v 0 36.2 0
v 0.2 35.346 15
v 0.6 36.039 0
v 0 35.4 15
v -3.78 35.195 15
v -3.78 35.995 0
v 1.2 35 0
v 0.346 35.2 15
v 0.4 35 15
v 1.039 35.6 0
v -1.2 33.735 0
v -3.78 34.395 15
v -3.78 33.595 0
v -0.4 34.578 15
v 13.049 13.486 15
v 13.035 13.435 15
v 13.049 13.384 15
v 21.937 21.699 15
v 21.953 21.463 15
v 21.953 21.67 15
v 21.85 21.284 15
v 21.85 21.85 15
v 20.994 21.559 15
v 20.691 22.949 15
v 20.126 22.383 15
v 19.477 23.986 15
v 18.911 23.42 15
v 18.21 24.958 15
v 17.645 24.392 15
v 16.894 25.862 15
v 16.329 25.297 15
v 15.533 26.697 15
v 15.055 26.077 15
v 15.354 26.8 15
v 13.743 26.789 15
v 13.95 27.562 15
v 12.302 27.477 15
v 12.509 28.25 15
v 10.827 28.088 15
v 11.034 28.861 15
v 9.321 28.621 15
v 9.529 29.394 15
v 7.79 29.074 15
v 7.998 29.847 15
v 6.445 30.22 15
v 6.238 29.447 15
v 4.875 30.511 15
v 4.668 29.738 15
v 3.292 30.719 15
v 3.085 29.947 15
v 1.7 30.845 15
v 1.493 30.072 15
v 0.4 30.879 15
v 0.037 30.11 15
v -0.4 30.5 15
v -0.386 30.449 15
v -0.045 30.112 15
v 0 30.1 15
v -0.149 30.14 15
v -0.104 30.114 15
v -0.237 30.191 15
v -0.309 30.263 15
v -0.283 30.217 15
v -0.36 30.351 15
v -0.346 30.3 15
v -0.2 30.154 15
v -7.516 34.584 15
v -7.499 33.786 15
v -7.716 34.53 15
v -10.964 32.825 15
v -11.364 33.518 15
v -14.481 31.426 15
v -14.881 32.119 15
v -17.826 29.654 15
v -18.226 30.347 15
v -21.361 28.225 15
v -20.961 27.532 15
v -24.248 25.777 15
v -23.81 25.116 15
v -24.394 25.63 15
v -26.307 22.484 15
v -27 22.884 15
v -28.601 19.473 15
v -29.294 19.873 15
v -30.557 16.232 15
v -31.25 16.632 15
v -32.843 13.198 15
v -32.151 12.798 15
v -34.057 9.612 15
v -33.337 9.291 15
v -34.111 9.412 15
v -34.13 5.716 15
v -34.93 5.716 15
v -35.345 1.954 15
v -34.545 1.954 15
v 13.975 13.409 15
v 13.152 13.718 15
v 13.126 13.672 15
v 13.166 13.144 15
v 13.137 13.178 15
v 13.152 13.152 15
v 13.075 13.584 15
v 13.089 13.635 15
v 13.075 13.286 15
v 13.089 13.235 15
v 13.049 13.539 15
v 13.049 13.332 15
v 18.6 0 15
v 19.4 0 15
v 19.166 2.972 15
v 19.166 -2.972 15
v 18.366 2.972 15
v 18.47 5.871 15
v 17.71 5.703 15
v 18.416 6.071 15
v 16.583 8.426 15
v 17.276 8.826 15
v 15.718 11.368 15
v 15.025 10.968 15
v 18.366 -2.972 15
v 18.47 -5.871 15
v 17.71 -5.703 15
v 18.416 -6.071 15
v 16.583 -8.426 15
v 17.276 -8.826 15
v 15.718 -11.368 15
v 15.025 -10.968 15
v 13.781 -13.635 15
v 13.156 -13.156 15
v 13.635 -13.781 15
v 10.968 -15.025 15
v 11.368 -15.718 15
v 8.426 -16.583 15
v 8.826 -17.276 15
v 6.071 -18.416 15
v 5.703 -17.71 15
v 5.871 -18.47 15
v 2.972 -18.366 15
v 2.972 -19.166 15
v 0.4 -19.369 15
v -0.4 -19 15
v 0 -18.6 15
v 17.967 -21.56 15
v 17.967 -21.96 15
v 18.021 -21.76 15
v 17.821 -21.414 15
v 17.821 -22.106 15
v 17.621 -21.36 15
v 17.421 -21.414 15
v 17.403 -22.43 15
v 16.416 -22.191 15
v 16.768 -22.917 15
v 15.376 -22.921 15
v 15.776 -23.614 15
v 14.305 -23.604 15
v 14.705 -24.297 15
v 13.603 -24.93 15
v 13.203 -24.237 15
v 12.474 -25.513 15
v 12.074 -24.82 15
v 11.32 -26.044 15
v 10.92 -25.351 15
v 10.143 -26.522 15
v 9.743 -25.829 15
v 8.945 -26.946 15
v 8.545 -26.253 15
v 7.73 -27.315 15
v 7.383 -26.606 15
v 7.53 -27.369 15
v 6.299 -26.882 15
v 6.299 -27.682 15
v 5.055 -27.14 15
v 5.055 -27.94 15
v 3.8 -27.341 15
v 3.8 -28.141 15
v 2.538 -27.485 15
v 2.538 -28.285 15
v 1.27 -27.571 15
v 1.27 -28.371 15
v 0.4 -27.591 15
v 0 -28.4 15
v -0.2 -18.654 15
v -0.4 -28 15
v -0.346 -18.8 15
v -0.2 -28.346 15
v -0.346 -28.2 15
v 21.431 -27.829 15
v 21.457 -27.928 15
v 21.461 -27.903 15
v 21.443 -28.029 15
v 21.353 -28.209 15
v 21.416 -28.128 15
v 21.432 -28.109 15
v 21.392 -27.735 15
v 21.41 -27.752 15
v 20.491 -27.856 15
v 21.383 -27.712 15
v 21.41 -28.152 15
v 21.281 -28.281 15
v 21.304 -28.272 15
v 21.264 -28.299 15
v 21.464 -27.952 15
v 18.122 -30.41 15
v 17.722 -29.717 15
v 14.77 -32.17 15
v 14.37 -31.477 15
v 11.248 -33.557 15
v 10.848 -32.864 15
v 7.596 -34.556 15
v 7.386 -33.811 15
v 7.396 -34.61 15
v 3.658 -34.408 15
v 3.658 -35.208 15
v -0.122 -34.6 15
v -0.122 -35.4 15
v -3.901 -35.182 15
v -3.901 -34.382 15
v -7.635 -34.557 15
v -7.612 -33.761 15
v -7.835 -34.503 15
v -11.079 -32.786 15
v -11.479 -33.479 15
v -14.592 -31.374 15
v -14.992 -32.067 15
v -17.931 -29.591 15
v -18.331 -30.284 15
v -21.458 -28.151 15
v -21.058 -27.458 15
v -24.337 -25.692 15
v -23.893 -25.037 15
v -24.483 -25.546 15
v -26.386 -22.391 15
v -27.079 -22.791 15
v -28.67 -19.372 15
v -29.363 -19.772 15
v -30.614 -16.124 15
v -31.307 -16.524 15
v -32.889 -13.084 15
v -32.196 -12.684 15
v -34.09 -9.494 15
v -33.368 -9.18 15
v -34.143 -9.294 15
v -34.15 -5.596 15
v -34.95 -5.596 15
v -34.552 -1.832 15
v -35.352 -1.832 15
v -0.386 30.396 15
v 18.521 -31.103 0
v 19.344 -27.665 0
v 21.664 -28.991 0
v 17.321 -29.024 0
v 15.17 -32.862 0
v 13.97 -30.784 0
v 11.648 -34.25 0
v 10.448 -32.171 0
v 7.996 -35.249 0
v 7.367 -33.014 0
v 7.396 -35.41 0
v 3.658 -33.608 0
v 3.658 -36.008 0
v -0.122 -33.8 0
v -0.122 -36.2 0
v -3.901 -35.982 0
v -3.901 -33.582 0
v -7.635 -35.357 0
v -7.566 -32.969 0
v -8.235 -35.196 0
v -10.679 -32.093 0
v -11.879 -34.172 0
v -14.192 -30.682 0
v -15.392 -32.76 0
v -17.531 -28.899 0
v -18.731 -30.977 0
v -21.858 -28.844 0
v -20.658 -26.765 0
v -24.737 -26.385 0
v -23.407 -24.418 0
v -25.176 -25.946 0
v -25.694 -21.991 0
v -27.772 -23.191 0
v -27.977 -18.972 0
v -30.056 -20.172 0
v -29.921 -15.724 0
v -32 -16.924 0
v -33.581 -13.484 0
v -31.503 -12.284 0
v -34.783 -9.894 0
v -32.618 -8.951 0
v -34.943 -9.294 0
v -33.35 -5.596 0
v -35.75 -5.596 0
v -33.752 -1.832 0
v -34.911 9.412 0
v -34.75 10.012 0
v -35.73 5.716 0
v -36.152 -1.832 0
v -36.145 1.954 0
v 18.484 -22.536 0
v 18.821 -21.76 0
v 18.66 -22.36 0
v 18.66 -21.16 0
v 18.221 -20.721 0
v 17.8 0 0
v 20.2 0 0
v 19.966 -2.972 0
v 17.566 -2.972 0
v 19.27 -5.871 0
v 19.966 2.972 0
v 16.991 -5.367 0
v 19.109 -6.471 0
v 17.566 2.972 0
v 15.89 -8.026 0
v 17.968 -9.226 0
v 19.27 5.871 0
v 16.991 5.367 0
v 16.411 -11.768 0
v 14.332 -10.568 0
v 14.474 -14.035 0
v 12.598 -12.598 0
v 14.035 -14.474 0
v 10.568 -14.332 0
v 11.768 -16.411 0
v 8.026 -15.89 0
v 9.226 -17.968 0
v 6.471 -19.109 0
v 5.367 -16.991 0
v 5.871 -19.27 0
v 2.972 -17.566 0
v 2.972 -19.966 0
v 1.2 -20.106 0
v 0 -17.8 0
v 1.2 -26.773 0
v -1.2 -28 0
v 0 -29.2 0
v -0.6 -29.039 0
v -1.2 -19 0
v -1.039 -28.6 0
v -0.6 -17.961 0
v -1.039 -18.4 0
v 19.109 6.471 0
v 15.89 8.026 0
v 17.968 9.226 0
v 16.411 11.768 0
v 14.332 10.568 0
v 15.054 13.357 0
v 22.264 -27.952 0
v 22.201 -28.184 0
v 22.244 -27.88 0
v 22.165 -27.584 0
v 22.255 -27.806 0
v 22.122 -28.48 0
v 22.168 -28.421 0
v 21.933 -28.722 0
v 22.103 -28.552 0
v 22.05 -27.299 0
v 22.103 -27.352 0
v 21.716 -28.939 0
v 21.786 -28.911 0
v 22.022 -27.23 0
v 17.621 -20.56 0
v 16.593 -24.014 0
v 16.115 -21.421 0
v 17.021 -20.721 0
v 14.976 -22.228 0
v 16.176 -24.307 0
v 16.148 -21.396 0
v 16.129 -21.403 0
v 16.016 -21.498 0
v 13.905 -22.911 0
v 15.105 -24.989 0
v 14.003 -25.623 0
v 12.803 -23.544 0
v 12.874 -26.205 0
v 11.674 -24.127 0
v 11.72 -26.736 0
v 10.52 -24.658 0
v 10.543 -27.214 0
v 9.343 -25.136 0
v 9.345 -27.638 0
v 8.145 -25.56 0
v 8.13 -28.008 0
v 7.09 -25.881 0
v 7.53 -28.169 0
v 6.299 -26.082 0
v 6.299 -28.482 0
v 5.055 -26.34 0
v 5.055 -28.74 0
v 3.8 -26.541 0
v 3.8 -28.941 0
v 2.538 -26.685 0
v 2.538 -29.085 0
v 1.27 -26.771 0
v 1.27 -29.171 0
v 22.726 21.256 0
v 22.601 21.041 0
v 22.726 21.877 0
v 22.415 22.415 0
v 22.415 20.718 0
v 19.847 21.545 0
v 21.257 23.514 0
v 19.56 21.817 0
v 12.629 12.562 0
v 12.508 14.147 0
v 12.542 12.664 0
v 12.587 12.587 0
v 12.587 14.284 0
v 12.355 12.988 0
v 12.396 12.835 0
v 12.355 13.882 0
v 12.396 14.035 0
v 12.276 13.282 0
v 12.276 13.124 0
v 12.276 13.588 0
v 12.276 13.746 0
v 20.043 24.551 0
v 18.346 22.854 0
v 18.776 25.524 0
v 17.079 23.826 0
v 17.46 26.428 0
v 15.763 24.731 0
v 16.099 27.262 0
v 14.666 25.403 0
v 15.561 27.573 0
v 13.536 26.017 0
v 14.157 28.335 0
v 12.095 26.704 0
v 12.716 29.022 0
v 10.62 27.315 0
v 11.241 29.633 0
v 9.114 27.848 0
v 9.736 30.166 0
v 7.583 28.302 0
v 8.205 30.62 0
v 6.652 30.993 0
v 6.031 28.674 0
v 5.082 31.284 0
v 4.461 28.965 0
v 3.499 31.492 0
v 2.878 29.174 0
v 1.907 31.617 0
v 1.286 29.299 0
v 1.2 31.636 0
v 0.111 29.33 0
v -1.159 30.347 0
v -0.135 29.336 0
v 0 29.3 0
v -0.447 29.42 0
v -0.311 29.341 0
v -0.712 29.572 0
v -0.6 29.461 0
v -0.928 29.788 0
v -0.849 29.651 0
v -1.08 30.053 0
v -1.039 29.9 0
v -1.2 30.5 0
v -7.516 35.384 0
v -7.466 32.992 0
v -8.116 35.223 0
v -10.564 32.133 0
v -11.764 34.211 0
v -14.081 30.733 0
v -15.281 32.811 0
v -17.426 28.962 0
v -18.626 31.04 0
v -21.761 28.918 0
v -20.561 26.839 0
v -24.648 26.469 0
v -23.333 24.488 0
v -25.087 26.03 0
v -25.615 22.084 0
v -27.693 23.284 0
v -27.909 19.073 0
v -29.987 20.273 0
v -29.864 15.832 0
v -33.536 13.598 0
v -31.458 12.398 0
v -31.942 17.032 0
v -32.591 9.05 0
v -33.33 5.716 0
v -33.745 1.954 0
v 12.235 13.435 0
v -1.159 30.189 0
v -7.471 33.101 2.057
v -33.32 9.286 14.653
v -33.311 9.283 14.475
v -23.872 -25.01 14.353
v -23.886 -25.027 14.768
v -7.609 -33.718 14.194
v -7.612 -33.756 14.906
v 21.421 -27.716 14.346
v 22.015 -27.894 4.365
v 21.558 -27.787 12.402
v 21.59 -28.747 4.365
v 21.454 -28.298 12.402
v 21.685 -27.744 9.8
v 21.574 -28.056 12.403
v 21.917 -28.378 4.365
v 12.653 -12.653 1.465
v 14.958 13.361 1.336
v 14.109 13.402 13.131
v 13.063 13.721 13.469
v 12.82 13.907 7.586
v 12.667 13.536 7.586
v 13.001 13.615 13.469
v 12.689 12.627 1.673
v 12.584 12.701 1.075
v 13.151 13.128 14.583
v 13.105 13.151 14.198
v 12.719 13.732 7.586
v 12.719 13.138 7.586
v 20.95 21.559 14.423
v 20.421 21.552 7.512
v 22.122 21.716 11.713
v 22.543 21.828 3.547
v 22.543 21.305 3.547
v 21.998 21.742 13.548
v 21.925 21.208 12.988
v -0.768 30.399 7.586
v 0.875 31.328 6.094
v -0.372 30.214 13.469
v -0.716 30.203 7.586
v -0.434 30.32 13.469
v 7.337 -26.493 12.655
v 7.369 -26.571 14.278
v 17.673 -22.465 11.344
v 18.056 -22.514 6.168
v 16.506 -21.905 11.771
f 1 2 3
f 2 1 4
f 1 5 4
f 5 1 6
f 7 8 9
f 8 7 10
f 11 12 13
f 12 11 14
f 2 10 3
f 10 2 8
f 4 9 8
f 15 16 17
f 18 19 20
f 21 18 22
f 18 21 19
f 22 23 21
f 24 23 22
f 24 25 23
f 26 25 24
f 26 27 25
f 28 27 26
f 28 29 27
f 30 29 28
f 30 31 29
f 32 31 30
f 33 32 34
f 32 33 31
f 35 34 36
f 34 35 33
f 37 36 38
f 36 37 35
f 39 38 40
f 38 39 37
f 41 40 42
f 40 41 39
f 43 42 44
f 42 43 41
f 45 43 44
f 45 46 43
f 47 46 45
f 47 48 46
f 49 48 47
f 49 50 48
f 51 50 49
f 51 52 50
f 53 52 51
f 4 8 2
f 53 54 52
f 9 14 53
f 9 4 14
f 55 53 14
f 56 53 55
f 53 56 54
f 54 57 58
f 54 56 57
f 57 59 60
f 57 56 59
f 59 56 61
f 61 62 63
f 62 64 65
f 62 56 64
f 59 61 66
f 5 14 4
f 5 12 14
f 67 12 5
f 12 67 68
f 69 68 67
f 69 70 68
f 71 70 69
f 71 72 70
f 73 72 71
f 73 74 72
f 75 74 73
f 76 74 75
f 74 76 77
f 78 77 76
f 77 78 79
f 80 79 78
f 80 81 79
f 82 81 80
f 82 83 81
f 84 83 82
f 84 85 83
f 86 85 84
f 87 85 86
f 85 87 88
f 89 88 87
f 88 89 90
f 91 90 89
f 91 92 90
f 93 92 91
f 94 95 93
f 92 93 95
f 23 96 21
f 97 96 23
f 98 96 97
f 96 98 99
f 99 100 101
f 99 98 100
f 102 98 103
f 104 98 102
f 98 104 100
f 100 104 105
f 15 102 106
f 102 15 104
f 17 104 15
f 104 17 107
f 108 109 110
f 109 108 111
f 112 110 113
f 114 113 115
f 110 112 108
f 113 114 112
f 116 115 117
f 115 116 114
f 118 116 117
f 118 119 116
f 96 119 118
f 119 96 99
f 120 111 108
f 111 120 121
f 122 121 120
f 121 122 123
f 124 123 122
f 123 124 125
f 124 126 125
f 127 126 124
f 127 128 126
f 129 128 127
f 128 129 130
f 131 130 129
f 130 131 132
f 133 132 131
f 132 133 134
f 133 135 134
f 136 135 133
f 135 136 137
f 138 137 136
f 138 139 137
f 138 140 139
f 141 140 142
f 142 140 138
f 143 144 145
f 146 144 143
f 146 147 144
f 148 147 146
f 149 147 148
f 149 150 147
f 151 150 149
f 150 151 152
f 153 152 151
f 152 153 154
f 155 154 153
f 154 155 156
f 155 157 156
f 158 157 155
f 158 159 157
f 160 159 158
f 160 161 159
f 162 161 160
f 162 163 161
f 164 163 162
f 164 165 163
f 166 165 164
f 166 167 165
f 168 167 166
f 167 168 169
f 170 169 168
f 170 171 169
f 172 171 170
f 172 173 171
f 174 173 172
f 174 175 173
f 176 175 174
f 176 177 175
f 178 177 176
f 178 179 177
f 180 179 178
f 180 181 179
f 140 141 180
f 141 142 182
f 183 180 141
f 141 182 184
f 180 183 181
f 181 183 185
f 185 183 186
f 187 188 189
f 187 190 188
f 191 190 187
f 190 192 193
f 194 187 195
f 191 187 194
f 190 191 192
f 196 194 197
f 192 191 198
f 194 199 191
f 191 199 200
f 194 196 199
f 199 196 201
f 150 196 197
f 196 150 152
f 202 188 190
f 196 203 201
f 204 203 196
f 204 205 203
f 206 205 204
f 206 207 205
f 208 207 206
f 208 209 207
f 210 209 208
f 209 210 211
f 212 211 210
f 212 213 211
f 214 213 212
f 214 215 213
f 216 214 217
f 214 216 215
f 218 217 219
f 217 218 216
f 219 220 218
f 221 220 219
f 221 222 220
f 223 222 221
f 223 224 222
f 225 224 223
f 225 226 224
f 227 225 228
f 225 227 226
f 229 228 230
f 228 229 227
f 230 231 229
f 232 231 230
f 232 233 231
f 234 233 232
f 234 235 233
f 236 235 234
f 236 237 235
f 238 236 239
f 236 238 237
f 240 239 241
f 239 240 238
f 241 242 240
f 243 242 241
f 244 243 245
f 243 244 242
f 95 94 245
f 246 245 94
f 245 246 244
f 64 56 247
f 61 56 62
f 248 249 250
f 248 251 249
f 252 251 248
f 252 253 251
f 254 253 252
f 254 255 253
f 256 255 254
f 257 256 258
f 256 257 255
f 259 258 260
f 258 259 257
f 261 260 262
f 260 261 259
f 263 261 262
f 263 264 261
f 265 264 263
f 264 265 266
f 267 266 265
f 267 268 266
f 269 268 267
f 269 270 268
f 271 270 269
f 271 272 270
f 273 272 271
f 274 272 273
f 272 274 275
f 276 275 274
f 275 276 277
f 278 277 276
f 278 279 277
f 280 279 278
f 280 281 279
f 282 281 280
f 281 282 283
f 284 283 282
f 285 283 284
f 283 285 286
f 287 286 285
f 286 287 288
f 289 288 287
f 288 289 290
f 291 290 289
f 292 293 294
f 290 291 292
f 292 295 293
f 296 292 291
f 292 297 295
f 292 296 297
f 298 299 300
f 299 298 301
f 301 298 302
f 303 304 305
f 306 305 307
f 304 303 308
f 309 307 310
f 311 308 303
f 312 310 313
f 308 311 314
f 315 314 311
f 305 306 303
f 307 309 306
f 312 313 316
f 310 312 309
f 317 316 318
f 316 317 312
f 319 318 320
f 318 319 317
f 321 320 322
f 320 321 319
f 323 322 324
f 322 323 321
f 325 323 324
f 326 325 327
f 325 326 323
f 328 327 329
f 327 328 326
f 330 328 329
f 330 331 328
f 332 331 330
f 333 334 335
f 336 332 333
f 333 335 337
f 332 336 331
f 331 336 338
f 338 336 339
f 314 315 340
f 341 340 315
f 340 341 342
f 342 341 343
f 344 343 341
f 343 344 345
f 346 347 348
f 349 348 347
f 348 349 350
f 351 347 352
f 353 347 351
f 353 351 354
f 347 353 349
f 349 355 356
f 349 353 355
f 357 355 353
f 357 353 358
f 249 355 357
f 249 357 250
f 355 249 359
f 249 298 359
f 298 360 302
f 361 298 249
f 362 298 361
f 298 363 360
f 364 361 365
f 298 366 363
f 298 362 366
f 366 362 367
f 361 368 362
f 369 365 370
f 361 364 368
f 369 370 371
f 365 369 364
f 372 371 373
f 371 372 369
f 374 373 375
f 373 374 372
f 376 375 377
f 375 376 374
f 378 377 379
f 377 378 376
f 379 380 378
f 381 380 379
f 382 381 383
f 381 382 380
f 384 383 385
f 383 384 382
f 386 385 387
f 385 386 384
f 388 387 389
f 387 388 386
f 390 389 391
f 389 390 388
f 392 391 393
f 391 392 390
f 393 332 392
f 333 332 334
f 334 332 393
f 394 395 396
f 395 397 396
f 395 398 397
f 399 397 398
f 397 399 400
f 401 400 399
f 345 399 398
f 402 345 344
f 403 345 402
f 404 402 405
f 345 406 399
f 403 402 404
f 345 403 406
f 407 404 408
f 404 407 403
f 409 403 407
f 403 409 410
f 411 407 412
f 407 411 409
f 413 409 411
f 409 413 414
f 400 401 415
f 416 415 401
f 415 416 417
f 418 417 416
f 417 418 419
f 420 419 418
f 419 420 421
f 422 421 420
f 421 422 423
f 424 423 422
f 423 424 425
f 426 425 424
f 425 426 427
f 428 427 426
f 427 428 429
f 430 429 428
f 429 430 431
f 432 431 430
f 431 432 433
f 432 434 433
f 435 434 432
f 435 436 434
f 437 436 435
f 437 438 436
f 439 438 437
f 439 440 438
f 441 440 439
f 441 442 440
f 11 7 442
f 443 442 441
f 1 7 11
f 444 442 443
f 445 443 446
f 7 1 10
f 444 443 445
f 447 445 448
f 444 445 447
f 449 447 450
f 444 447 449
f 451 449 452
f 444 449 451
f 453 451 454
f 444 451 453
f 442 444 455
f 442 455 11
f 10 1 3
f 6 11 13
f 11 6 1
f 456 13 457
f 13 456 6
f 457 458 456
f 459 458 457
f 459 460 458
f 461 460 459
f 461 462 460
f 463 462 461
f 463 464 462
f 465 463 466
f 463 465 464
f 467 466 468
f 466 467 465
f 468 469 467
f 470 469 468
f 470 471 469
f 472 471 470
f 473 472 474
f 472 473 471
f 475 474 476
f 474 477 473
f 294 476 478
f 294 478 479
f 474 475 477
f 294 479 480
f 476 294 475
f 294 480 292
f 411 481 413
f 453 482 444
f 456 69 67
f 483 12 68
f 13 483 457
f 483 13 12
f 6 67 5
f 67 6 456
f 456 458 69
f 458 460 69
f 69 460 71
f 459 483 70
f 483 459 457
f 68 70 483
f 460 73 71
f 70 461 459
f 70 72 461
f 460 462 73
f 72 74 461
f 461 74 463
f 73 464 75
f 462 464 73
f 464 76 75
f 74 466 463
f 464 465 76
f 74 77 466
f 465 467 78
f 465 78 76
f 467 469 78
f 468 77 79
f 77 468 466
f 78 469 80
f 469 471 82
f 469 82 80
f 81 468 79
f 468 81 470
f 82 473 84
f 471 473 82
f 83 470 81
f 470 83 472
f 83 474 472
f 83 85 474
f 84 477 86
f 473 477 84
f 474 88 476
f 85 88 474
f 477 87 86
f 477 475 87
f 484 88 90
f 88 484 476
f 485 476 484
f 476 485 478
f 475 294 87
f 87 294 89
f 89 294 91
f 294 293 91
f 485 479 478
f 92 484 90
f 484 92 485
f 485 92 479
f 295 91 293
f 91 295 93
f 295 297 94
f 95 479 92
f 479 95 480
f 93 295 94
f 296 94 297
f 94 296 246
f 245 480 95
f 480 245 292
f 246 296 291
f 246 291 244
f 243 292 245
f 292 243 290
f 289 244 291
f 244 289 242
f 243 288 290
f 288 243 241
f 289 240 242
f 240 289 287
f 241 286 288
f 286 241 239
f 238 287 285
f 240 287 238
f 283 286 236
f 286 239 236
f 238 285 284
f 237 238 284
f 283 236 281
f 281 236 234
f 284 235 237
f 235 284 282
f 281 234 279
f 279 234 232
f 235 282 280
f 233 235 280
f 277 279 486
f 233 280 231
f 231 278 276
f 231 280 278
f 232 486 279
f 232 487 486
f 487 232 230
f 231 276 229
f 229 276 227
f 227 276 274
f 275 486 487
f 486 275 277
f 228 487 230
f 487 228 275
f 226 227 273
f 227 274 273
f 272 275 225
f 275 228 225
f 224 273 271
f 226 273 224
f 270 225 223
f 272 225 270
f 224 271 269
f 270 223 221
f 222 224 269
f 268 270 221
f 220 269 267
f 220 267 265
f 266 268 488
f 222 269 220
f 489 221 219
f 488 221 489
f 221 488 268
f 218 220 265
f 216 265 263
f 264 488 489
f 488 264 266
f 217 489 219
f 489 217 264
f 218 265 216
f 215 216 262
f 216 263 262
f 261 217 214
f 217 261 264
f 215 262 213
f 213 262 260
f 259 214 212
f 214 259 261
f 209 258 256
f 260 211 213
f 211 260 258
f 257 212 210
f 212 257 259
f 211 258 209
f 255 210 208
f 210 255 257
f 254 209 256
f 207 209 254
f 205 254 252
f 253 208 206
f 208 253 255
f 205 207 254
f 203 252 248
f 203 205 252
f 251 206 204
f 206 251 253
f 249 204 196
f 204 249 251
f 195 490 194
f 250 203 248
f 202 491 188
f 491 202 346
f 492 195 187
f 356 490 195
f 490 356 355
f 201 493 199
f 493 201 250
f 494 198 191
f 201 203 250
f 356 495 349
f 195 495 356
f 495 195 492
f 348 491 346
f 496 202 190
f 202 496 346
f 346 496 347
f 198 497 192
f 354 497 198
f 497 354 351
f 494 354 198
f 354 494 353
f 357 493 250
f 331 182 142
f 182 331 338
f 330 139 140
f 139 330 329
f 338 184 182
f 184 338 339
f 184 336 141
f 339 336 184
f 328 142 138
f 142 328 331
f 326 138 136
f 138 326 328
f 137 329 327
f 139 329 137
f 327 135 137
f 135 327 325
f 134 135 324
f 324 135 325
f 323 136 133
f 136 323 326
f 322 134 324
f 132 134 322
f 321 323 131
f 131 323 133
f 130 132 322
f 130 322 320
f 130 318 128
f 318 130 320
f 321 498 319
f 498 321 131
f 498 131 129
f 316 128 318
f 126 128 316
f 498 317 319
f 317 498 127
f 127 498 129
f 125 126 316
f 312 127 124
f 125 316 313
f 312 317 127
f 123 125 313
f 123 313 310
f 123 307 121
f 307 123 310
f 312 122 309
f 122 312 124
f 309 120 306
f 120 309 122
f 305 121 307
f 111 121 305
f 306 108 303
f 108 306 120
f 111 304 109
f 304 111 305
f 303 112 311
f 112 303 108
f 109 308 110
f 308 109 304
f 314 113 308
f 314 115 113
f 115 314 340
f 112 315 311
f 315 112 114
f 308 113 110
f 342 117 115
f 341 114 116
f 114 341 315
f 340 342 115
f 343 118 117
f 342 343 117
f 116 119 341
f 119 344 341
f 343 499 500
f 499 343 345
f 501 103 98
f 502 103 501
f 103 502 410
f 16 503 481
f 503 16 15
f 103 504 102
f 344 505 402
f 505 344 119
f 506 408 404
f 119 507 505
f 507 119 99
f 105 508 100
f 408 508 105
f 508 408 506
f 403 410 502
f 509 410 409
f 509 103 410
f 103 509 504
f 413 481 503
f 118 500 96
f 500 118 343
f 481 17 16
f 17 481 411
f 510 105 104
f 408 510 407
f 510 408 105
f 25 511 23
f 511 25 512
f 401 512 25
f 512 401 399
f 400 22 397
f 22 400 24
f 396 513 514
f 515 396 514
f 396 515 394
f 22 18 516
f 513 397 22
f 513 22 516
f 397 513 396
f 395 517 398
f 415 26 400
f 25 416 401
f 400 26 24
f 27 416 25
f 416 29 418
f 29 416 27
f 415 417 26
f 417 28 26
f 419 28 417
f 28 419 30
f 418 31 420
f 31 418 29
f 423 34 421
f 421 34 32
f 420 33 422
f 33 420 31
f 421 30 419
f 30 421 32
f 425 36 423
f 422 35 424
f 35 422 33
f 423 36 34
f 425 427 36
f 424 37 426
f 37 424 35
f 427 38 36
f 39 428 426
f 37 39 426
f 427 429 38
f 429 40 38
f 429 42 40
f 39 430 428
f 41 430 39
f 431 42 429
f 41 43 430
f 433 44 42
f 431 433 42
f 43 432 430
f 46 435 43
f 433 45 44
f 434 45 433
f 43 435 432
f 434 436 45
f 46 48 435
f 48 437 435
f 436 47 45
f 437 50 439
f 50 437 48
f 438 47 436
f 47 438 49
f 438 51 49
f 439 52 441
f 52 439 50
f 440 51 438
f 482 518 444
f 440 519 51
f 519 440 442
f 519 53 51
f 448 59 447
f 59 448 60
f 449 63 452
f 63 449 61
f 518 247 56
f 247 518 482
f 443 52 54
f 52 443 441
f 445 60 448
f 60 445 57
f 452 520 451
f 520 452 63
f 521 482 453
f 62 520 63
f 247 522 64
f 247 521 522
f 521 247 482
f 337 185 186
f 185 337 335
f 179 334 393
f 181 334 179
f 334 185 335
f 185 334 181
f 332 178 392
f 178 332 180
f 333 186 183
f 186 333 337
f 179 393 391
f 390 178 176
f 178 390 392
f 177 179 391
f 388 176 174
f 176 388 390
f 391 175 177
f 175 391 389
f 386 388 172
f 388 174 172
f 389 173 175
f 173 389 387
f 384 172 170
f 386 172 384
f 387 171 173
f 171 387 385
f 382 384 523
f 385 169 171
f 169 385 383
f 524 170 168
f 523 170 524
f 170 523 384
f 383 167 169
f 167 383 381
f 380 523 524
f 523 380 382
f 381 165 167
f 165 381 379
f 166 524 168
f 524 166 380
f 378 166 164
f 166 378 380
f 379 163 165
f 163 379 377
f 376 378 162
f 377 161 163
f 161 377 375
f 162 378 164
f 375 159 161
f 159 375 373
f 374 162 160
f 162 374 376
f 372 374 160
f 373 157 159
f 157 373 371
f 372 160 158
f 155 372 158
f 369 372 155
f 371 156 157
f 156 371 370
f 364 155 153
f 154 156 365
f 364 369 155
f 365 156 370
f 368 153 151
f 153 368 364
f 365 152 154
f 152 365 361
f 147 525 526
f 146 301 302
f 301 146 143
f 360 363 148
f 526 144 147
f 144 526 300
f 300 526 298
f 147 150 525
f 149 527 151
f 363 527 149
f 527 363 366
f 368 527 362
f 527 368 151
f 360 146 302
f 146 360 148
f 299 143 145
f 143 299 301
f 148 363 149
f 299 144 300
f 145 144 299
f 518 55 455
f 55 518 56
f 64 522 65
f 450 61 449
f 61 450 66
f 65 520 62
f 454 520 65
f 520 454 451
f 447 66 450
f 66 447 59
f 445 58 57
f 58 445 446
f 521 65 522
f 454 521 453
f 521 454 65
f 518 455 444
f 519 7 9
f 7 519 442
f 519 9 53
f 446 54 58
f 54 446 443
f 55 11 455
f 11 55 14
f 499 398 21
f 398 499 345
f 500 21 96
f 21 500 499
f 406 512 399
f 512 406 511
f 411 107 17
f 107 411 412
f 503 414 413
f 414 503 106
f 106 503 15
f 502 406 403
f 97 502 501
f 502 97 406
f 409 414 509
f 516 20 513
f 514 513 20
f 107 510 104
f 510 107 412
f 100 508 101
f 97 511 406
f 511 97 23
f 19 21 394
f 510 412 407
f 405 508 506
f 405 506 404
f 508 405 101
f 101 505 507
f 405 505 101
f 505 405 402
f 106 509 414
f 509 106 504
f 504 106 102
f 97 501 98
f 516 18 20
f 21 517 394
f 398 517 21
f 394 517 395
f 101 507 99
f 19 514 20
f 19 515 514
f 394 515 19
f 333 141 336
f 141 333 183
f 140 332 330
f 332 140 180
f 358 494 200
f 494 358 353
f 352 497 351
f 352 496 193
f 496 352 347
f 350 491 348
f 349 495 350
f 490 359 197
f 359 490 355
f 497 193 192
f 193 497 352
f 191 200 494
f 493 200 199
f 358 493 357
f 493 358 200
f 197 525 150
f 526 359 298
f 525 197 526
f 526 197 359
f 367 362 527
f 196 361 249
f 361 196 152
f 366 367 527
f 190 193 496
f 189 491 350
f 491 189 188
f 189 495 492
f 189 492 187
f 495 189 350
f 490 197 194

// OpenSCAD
// variables
w1 = 2.4;   // cookie cutter, thicker side
w2 = 0.8;   // cookie cutter, thinner side
h = 15;     // cookie cutter height

// model
rotate([0, 0, 90])circle_ish(35, 217, 35);
rotate([0, 0, -90])circle_ish(19, 135, 15);
rotate([0, 0, 45])circle_ish(30.5, 45, 15);
rotate([0, 0, 270])circle_ish(28, 39, 15);
straight_line([0, 35], [0, 30.5]);
rotate([0, 0, -45])straight_line([0, 19], [0, 30.5]);
straight_line([0, -28], [0, -19]);
rotate([0, 0, -53])straight_line([35, 0], [28, 0]);

// functions and modules
module shape() cylinder(h, w1/2, w2/2, $fn=12);

module straight_line(a, b)
    hull(){ 
       translate(a) shape();
       translate(b) shape();
    };
    
module circle_ish(r, angle, fn) 
 let (interval = angle/fn)
    for (i= [0:interval:(angle-interval)]) 
        hull(){
            translate([cos(i)*r, sin(i)*r, 0]) shape(); 
            translate([cos(i+interval)*r, sin(i+interval)*r, 0]) shape(); 
        };
